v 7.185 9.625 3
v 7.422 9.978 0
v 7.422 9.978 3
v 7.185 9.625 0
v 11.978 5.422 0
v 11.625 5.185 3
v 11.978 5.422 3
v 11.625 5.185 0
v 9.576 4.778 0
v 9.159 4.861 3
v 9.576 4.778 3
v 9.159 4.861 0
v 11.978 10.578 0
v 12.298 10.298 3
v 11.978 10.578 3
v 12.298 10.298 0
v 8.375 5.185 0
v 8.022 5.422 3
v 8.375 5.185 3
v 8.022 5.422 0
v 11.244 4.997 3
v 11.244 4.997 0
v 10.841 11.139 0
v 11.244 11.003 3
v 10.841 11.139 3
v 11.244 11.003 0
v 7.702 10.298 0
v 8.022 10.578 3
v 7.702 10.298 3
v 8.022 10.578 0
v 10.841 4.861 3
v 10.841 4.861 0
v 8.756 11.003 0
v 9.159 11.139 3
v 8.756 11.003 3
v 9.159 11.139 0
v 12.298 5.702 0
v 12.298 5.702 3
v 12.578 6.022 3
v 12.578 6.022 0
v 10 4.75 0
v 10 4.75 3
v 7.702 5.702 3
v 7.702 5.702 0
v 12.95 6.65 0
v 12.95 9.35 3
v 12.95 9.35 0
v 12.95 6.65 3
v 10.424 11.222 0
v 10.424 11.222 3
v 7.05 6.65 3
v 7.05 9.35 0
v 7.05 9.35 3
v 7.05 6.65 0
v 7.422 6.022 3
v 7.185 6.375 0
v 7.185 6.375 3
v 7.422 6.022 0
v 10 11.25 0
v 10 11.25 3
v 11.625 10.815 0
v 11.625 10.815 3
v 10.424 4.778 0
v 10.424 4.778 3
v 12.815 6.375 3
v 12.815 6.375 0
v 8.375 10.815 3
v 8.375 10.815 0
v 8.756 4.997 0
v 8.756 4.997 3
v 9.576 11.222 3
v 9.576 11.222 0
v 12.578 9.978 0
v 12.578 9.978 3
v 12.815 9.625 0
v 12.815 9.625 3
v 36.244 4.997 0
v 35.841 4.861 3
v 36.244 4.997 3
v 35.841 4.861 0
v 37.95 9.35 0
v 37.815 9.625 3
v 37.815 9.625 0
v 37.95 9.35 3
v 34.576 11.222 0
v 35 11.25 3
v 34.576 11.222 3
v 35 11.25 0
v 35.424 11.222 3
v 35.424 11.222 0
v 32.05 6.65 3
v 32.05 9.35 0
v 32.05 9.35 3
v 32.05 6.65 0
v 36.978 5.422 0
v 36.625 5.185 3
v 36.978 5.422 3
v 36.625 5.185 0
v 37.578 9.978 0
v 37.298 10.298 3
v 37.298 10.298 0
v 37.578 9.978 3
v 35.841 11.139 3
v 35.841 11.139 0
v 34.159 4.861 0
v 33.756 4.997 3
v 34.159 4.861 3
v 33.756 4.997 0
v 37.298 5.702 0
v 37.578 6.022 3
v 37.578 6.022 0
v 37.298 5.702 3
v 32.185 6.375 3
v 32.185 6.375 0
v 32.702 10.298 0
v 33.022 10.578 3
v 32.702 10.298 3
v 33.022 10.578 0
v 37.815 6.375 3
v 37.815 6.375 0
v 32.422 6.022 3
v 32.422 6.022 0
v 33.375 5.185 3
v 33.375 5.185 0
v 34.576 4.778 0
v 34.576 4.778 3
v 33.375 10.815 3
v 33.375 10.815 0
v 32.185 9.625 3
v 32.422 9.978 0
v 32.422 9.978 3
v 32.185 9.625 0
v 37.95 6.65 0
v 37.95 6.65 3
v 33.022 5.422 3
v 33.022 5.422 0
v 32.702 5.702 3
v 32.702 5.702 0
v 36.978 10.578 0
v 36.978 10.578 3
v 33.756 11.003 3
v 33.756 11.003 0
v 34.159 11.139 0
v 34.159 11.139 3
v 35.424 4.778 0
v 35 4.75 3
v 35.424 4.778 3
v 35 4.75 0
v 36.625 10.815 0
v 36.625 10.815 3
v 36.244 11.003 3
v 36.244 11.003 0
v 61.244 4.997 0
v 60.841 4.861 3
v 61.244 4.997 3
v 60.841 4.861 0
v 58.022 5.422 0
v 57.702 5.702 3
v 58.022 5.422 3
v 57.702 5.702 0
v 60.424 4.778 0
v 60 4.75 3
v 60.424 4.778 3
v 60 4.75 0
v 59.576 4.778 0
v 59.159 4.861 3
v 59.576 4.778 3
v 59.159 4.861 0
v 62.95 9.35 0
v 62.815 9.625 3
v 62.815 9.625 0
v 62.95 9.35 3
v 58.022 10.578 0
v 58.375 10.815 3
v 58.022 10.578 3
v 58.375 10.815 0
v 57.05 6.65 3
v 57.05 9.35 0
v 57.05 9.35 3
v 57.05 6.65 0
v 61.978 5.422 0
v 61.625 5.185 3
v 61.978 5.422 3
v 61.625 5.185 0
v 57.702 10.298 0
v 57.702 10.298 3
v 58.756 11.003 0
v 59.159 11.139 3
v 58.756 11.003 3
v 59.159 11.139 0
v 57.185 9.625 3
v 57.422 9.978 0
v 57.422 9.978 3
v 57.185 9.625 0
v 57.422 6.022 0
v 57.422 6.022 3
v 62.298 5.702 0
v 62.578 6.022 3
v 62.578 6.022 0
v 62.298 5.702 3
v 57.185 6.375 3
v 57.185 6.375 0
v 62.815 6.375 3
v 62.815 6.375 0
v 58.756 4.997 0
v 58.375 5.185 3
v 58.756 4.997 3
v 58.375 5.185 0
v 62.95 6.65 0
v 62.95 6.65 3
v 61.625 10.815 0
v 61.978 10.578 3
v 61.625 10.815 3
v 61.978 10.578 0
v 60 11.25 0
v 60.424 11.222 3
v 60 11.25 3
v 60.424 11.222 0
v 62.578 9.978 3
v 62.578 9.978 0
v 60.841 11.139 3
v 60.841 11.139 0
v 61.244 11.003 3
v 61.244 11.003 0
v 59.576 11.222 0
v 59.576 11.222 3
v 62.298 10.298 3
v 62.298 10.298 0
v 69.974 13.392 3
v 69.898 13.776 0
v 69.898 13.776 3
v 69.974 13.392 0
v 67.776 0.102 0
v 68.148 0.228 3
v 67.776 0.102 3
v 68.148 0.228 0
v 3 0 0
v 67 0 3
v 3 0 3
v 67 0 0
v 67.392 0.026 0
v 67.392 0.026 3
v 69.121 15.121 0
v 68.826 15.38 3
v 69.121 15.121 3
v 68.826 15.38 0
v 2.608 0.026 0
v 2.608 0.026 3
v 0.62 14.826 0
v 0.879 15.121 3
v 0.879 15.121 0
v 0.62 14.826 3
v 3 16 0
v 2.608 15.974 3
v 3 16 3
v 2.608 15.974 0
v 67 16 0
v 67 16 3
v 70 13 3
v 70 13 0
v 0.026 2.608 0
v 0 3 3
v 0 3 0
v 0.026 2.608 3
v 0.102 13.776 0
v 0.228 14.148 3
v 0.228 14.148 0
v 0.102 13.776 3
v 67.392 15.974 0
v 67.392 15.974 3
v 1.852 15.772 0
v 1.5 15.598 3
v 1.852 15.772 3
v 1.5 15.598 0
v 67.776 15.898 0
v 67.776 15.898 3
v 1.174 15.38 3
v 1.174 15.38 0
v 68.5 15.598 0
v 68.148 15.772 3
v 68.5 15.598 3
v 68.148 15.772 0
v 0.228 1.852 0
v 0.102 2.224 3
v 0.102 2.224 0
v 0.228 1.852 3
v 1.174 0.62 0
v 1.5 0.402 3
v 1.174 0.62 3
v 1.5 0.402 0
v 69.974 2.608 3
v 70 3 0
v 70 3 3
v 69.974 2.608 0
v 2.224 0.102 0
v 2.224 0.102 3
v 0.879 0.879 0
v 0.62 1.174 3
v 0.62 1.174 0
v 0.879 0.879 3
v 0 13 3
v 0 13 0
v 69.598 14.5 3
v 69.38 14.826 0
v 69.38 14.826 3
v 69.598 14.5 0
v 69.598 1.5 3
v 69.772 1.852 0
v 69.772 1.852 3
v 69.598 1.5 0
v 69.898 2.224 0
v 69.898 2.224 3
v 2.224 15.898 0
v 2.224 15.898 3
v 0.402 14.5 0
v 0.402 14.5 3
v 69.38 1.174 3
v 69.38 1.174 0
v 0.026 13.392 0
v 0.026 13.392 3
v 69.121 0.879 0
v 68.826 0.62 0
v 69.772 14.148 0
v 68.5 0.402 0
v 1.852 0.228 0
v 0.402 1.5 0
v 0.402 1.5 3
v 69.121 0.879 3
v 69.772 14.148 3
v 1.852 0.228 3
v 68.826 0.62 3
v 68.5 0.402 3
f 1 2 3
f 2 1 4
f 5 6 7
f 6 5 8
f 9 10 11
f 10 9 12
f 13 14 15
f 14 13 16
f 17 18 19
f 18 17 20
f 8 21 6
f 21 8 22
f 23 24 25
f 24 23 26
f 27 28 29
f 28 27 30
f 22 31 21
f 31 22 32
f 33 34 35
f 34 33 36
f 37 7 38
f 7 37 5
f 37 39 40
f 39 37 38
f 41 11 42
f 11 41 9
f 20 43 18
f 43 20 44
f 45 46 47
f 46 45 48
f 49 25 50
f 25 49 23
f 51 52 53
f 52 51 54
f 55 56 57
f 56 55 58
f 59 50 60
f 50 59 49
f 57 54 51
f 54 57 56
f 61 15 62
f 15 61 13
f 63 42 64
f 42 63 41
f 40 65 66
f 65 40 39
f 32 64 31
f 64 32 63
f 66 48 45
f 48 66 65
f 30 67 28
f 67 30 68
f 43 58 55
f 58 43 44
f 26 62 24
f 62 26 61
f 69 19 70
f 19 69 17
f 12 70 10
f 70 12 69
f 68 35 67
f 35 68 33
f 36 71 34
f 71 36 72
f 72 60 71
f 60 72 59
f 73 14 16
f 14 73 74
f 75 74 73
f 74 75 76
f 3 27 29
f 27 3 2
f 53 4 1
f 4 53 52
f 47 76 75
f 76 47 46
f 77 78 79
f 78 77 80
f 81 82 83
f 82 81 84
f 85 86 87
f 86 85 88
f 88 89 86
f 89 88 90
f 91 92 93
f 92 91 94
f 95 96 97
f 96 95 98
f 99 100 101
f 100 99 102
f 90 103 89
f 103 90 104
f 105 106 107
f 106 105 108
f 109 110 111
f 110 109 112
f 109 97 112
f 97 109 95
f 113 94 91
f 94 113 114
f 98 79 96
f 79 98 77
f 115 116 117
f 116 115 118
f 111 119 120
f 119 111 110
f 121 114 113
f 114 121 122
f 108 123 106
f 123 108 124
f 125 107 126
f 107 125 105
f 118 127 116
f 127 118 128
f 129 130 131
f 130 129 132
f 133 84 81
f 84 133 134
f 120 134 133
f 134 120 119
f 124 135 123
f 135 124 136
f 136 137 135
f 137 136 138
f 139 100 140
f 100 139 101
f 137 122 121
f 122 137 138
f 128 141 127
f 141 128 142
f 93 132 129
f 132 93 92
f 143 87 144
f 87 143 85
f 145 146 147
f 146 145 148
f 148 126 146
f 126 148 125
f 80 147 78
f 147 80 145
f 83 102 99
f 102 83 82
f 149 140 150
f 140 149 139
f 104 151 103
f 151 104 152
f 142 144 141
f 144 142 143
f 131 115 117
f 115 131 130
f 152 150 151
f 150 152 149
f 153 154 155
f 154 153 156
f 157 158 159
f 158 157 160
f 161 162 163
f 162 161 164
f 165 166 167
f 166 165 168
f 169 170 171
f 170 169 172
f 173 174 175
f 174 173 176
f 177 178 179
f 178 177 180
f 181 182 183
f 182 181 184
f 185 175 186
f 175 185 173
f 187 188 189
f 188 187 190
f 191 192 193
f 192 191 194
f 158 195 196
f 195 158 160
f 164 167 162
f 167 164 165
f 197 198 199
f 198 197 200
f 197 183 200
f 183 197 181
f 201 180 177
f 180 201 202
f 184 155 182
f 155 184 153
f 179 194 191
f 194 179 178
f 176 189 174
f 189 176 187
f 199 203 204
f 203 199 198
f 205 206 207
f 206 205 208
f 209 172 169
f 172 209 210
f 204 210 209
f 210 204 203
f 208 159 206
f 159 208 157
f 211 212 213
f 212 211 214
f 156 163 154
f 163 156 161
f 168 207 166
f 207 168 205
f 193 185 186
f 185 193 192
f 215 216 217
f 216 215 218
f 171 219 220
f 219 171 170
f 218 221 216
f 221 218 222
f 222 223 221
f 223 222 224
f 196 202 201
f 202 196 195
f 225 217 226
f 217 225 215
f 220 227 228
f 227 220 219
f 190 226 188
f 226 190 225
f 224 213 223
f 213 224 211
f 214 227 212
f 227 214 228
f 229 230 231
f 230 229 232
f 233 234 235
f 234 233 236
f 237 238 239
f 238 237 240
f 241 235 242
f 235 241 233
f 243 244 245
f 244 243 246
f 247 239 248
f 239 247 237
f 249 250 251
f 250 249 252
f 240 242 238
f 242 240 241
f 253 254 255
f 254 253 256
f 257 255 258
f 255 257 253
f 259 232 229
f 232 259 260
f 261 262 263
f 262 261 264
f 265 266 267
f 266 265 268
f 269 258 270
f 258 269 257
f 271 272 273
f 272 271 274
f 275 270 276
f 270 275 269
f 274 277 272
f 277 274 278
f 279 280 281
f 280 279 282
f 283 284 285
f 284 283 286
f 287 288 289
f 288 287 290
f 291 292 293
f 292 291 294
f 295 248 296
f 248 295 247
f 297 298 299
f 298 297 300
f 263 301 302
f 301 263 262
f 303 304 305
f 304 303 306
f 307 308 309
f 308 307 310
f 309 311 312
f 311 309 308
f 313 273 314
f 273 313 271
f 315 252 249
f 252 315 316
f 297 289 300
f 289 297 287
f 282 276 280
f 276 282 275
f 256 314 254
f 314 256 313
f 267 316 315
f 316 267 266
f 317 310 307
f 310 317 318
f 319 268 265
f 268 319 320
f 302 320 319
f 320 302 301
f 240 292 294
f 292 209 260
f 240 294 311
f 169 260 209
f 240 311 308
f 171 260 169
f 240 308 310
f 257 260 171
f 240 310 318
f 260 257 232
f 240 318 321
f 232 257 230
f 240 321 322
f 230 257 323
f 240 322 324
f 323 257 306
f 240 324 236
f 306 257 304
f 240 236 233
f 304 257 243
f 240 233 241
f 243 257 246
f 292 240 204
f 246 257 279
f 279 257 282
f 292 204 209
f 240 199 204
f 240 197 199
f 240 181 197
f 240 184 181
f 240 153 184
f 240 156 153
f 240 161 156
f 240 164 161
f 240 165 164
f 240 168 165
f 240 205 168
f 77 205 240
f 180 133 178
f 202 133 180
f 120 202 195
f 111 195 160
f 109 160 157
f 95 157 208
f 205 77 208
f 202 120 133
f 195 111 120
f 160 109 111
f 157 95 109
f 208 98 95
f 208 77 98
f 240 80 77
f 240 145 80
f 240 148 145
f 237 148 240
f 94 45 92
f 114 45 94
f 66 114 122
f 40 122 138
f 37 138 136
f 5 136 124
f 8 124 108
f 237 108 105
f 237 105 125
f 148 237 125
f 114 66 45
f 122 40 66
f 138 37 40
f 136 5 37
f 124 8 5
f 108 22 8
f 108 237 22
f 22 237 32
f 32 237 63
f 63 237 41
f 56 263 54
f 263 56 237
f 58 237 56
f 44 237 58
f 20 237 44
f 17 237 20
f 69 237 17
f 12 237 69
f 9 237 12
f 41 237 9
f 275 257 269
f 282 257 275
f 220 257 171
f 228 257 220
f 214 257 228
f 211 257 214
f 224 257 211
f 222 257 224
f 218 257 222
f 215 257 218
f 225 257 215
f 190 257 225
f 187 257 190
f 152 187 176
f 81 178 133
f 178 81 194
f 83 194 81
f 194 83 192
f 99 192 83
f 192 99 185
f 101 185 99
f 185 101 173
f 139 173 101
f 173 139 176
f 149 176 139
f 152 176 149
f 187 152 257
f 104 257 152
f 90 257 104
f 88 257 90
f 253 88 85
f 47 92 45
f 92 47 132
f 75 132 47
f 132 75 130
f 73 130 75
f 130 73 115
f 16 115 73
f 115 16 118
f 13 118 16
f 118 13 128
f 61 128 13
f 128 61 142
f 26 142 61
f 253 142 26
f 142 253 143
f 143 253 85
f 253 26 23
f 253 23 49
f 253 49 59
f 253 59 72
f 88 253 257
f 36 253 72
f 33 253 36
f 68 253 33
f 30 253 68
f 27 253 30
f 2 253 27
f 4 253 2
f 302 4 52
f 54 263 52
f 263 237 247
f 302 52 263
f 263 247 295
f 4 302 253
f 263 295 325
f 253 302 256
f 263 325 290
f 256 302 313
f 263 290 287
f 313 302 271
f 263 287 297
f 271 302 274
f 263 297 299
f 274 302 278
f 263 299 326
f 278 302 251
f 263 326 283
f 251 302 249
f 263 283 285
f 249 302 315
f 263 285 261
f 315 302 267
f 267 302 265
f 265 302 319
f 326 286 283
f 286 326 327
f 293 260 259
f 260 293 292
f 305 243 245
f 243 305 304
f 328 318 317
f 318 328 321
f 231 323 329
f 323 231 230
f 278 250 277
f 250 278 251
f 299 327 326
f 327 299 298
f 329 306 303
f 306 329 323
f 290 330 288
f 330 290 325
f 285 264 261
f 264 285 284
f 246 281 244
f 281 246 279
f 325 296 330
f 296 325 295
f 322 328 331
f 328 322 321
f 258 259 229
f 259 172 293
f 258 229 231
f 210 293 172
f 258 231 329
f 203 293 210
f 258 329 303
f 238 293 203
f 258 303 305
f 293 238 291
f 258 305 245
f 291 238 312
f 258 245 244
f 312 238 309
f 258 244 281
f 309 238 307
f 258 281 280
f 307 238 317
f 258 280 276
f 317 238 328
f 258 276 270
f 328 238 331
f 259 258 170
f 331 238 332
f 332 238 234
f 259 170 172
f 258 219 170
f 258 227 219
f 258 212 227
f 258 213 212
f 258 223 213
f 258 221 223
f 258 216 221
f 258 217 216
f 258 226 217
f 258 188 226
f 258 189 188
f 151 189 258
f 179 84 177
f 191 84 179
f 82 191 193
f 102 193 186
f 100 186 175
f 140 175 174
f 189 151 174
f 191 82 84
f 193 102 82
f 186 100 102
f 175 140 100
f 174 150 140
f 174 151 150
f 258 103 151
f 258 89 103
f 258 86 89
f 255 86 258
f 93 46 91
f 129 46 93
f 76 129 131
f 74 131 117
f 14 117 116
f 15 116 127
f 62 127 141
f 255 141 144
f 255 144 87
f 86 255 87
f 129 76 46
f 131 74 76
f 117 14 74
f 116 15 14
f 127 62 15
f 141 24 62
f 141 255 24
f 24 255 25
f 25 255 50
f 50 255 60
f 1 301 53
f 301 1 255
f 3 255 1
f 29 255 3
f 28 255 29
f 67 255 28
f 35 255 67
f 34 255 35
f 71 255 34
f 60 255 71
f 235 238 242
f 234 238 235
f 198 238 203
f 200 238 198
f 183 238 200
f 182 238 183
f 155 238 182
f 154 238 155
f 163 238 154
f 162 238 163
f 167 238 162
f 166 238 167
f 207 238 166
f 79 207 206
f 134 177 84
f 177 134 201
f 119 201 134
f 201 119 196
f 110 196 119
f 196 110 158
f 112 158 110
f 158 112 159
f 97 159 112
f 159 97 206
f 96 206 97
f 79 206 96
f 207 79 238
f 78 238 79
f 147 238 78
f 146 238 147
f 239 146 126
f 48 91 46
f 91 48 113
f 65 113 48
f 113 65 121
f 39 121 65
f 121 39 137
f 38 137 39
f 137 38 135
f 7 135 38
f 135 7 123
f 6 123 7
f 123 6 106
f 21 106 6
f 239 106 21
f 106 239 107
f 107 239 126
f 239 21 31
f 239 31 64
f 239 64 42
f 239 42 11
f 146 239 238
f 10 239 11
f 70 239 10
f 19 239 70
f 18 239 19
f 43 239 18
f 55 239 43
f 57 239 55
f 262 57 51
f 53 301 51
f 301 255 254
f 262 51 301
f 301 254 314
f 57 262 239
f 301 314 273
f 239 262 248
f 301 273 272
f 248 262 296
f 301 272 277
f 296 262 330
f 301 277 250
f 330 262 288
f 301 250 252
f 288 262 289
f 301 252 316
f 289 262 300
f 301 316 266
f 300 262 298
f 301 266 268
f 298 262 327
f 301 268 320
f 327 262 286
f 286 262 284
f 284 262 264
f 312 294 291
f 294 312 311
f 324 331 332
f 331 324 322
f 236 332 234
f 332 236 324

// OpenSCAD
// file: bugout.scad
// bugout.scad - shared library for the Bugout SDR mounting system.
//
// Everything mounts on a 20 mm grid of M3 holes. Base tiles carry captive
// M3 nuts underneath, so any bracket with grid-spaced slots can be bolted
// anywhere on the floor with M3 x 8-12 mm screws.
//
// Include this from part files with:  include <bugout.scad>

$fn = 48;

// ---- Grid and hardware ---------------------------------------------------
PITCH      = 20;     // grid spacing, mm
M3_CLEAR   = 3.4;    // M3 clearance hole
M3_HEAD_D  = 6.2;    // M3 socket head counterbore
M3_HEAD_H  = 3.2;
M3_NUT_AF  = 5.7;    // M3 nut across flats, with print clearance
M3_NUT_H   = 2.6;
M3_INSERT  = 4.2;    // hole for M3 heat-set insert (if you prefer inserts)

// ---- Printing ------------------------------------------------------------
WALL   = 2.4;        // default wall, a multiple of a 0.4 nozzle
CHAMF  = 0.8;        // edge chamfer

// ---- Helpers -------------------------------------------------------------

// Hexagon prism for a nut trap, flats aligned with X.
module nut_trap(h = M3_NUT_H, af = M3_NUT_AF) {
    cylinder(d = af / cos(30), h = h, $fn = 6);
}

// Through hole for M3, optionally with counterbore at the top (z = h).
module m3_hole(h, counterbore = false) {
    translate([0, 0, -0.01]) cylinder(d = M3_CLEAR, h = h + 0.02);
    if (counterbore)
        translate([0, 0, h - M3_HEAD_H]) cylinder(d = M3_HEAD_D, h = M3_HEAD_H + 0.01);
}

// Slot of length len (centre to centre) along X, for M3.
module m3_slot(len, h, d = M3_CLEAR) {
    translate([0, 0, -0.01]) hull() {
        cylinder(d = d, h = h + 0.02);
        translate([len, 0, 0]) cylinder(d = d, h = h + 0.02);
    }
}

// Rounded rectangle plate, corner radius r, origin at the corner.
module rplate(w, d, h, r = 3) {
    r2 = min(r, w / 2 - 0.01, d / 2 - 0.01);
    translate([r2, r2, 0]) linear_extrude(h)
        offset(r = r2) square([w - 2 * r2, d - 2 * r2]);
}

// Grid of points, nx by ny, starting at (x0, y0).
module grid(nx, ny, x0 = 0, y0 = 0, p = PITCH) {
    for (i = [0 : nx - 1], j = [0 : ny - 1])
        translate([x0 + i * p, y0 + j * p, 0]) children();
}

// Mounting foot: a plate with M3 slots on the grid, so any part can be
// bolted down and slid up to one pitch along X. Footprint nx x ny cells.
// With counterbore = true the screw heads sit flush with the top (h >= 6),
// so a battery or dongle can sit directly on the foot.
module grid_foot(nx, ny, h = 4, counterbore = false) {
    difference() {
        rplate(nx * PITCH, ny * PITCH, h);
        for (j = [0 : ny - 1])
            translate([PITCH / 2, PITCH / 2 + j * PITCH, 0]) {
                m3_slot((nx - 1) * PITCH, h);
                if (counterbore)
                    translate([0, 0, h - M3_HEAD_H])
                        m3_slot((nx - 1) * PITCH, M3_HEAD_H, M3_HEAD_D);
            }
    }
}

// Velcro / strap slot through a wall, slot width sw, height sh.
module strap_slot(sw = 22, sh = 3, depth = 20) {
    translate([-sw / 2, -depth / 2, 0]) cube([sw, depth, sh]);
}
// main file
// lid_antenna.scad - weatherproof antenna bulkheads through the case lid.
//
// The connectors themselves keep the water out: use SMA (or BNC/N) bulkhead
// jacks that come with an O-ring, fitted with the O-ring on the OUTSIDE of
// the lid, plus a dust cap on each when not in use. These printed parts
// make the install clean and strong:
//   "template" - drill guide. Tape it to the outside of the lid, drill
//                a 2 mm pilot through each hole, then step up to 6.5 mm (SMA).
//   "backer"   - inside stiffener plate, bonded to the lid with epoxy or VHB.
//                The bulkhead nuts clamp the thin lid wall between the O-ring
//                and this plate, and its D-flat holes stop the jacks spinning
//                when you screw an antenna on.
// Where: the lid's side wall opposite the hinge. With the lid open that
// edge points up, so antennas stand vertical, which suits VHF/UHF, and the
// wall is clear of the display. Centre the holes ~12 mm above the lid floor,
// just above the lid_plate. Inside, RG316 pigtails run along the lid with a
// slack loop across the hinge to the SDR in the base.
//
// Print flat. PETG or ASA for the backer if the case lives in a hot car.

include <bugout.scad>

PART  = "backer";

N     = 3;        // number of connectors
SPACE = 25;       // centre spacing (enough for fingers and SMA wrenches)
HOLE_D = 6.5;     // SMA 1/4-36 bulkhead. BNC: 9.7, N-type: 16
FLAT   = 5.9;     // across the D-flat. BNC: 8.9
BACKER_T = 3;
MARGIN = 10;
BACKER_H = 16;    // fits the lid side wall above the 4 mm lid_plate

W = (N - 1) * SPACE + 2 * MARGIN;
D = BACKER_H;

module dhole(d, f, h) {
    linear_extrude(h) intersection() {
        circle(d = d);
        square([f, d + 1], center = true);
    }
}

module template() {
    difference() {
        rplate(W, D, 1.6, 3);
        for (i = [0 : N - 1]) translate([MARGIN + i * SPACE, D / 2, -0.01]) {
            cylinder(d = 2, h = 2);
        }
        // notches to line up on a pencil line
        for (i = [0 : N - 1]) translate([MARGIN + i * SPACE, 0, -0.01]) {
            translate([-0.4, -0.01, 0]) cube([0.8, 3, 2]);
            translate([-0.4, D - 3 + 0.01, 0]) cube([0.8, 3, 2]);
        }
    }
}

module backer() {
    difference() {
        rplate(W, D, BACKER_T, 3);
        for (i = [0 : N - 1]) translate([MARGIN + i * SPACE, D / 2, -0.01]) {
            // D-flat through hole keys the jack body
            dhole(HOLE_D, FLAT, BACKER_T + 0.02);
        }
    }
}

if (PART == "template") template();
if (PART == "backer") backer();
